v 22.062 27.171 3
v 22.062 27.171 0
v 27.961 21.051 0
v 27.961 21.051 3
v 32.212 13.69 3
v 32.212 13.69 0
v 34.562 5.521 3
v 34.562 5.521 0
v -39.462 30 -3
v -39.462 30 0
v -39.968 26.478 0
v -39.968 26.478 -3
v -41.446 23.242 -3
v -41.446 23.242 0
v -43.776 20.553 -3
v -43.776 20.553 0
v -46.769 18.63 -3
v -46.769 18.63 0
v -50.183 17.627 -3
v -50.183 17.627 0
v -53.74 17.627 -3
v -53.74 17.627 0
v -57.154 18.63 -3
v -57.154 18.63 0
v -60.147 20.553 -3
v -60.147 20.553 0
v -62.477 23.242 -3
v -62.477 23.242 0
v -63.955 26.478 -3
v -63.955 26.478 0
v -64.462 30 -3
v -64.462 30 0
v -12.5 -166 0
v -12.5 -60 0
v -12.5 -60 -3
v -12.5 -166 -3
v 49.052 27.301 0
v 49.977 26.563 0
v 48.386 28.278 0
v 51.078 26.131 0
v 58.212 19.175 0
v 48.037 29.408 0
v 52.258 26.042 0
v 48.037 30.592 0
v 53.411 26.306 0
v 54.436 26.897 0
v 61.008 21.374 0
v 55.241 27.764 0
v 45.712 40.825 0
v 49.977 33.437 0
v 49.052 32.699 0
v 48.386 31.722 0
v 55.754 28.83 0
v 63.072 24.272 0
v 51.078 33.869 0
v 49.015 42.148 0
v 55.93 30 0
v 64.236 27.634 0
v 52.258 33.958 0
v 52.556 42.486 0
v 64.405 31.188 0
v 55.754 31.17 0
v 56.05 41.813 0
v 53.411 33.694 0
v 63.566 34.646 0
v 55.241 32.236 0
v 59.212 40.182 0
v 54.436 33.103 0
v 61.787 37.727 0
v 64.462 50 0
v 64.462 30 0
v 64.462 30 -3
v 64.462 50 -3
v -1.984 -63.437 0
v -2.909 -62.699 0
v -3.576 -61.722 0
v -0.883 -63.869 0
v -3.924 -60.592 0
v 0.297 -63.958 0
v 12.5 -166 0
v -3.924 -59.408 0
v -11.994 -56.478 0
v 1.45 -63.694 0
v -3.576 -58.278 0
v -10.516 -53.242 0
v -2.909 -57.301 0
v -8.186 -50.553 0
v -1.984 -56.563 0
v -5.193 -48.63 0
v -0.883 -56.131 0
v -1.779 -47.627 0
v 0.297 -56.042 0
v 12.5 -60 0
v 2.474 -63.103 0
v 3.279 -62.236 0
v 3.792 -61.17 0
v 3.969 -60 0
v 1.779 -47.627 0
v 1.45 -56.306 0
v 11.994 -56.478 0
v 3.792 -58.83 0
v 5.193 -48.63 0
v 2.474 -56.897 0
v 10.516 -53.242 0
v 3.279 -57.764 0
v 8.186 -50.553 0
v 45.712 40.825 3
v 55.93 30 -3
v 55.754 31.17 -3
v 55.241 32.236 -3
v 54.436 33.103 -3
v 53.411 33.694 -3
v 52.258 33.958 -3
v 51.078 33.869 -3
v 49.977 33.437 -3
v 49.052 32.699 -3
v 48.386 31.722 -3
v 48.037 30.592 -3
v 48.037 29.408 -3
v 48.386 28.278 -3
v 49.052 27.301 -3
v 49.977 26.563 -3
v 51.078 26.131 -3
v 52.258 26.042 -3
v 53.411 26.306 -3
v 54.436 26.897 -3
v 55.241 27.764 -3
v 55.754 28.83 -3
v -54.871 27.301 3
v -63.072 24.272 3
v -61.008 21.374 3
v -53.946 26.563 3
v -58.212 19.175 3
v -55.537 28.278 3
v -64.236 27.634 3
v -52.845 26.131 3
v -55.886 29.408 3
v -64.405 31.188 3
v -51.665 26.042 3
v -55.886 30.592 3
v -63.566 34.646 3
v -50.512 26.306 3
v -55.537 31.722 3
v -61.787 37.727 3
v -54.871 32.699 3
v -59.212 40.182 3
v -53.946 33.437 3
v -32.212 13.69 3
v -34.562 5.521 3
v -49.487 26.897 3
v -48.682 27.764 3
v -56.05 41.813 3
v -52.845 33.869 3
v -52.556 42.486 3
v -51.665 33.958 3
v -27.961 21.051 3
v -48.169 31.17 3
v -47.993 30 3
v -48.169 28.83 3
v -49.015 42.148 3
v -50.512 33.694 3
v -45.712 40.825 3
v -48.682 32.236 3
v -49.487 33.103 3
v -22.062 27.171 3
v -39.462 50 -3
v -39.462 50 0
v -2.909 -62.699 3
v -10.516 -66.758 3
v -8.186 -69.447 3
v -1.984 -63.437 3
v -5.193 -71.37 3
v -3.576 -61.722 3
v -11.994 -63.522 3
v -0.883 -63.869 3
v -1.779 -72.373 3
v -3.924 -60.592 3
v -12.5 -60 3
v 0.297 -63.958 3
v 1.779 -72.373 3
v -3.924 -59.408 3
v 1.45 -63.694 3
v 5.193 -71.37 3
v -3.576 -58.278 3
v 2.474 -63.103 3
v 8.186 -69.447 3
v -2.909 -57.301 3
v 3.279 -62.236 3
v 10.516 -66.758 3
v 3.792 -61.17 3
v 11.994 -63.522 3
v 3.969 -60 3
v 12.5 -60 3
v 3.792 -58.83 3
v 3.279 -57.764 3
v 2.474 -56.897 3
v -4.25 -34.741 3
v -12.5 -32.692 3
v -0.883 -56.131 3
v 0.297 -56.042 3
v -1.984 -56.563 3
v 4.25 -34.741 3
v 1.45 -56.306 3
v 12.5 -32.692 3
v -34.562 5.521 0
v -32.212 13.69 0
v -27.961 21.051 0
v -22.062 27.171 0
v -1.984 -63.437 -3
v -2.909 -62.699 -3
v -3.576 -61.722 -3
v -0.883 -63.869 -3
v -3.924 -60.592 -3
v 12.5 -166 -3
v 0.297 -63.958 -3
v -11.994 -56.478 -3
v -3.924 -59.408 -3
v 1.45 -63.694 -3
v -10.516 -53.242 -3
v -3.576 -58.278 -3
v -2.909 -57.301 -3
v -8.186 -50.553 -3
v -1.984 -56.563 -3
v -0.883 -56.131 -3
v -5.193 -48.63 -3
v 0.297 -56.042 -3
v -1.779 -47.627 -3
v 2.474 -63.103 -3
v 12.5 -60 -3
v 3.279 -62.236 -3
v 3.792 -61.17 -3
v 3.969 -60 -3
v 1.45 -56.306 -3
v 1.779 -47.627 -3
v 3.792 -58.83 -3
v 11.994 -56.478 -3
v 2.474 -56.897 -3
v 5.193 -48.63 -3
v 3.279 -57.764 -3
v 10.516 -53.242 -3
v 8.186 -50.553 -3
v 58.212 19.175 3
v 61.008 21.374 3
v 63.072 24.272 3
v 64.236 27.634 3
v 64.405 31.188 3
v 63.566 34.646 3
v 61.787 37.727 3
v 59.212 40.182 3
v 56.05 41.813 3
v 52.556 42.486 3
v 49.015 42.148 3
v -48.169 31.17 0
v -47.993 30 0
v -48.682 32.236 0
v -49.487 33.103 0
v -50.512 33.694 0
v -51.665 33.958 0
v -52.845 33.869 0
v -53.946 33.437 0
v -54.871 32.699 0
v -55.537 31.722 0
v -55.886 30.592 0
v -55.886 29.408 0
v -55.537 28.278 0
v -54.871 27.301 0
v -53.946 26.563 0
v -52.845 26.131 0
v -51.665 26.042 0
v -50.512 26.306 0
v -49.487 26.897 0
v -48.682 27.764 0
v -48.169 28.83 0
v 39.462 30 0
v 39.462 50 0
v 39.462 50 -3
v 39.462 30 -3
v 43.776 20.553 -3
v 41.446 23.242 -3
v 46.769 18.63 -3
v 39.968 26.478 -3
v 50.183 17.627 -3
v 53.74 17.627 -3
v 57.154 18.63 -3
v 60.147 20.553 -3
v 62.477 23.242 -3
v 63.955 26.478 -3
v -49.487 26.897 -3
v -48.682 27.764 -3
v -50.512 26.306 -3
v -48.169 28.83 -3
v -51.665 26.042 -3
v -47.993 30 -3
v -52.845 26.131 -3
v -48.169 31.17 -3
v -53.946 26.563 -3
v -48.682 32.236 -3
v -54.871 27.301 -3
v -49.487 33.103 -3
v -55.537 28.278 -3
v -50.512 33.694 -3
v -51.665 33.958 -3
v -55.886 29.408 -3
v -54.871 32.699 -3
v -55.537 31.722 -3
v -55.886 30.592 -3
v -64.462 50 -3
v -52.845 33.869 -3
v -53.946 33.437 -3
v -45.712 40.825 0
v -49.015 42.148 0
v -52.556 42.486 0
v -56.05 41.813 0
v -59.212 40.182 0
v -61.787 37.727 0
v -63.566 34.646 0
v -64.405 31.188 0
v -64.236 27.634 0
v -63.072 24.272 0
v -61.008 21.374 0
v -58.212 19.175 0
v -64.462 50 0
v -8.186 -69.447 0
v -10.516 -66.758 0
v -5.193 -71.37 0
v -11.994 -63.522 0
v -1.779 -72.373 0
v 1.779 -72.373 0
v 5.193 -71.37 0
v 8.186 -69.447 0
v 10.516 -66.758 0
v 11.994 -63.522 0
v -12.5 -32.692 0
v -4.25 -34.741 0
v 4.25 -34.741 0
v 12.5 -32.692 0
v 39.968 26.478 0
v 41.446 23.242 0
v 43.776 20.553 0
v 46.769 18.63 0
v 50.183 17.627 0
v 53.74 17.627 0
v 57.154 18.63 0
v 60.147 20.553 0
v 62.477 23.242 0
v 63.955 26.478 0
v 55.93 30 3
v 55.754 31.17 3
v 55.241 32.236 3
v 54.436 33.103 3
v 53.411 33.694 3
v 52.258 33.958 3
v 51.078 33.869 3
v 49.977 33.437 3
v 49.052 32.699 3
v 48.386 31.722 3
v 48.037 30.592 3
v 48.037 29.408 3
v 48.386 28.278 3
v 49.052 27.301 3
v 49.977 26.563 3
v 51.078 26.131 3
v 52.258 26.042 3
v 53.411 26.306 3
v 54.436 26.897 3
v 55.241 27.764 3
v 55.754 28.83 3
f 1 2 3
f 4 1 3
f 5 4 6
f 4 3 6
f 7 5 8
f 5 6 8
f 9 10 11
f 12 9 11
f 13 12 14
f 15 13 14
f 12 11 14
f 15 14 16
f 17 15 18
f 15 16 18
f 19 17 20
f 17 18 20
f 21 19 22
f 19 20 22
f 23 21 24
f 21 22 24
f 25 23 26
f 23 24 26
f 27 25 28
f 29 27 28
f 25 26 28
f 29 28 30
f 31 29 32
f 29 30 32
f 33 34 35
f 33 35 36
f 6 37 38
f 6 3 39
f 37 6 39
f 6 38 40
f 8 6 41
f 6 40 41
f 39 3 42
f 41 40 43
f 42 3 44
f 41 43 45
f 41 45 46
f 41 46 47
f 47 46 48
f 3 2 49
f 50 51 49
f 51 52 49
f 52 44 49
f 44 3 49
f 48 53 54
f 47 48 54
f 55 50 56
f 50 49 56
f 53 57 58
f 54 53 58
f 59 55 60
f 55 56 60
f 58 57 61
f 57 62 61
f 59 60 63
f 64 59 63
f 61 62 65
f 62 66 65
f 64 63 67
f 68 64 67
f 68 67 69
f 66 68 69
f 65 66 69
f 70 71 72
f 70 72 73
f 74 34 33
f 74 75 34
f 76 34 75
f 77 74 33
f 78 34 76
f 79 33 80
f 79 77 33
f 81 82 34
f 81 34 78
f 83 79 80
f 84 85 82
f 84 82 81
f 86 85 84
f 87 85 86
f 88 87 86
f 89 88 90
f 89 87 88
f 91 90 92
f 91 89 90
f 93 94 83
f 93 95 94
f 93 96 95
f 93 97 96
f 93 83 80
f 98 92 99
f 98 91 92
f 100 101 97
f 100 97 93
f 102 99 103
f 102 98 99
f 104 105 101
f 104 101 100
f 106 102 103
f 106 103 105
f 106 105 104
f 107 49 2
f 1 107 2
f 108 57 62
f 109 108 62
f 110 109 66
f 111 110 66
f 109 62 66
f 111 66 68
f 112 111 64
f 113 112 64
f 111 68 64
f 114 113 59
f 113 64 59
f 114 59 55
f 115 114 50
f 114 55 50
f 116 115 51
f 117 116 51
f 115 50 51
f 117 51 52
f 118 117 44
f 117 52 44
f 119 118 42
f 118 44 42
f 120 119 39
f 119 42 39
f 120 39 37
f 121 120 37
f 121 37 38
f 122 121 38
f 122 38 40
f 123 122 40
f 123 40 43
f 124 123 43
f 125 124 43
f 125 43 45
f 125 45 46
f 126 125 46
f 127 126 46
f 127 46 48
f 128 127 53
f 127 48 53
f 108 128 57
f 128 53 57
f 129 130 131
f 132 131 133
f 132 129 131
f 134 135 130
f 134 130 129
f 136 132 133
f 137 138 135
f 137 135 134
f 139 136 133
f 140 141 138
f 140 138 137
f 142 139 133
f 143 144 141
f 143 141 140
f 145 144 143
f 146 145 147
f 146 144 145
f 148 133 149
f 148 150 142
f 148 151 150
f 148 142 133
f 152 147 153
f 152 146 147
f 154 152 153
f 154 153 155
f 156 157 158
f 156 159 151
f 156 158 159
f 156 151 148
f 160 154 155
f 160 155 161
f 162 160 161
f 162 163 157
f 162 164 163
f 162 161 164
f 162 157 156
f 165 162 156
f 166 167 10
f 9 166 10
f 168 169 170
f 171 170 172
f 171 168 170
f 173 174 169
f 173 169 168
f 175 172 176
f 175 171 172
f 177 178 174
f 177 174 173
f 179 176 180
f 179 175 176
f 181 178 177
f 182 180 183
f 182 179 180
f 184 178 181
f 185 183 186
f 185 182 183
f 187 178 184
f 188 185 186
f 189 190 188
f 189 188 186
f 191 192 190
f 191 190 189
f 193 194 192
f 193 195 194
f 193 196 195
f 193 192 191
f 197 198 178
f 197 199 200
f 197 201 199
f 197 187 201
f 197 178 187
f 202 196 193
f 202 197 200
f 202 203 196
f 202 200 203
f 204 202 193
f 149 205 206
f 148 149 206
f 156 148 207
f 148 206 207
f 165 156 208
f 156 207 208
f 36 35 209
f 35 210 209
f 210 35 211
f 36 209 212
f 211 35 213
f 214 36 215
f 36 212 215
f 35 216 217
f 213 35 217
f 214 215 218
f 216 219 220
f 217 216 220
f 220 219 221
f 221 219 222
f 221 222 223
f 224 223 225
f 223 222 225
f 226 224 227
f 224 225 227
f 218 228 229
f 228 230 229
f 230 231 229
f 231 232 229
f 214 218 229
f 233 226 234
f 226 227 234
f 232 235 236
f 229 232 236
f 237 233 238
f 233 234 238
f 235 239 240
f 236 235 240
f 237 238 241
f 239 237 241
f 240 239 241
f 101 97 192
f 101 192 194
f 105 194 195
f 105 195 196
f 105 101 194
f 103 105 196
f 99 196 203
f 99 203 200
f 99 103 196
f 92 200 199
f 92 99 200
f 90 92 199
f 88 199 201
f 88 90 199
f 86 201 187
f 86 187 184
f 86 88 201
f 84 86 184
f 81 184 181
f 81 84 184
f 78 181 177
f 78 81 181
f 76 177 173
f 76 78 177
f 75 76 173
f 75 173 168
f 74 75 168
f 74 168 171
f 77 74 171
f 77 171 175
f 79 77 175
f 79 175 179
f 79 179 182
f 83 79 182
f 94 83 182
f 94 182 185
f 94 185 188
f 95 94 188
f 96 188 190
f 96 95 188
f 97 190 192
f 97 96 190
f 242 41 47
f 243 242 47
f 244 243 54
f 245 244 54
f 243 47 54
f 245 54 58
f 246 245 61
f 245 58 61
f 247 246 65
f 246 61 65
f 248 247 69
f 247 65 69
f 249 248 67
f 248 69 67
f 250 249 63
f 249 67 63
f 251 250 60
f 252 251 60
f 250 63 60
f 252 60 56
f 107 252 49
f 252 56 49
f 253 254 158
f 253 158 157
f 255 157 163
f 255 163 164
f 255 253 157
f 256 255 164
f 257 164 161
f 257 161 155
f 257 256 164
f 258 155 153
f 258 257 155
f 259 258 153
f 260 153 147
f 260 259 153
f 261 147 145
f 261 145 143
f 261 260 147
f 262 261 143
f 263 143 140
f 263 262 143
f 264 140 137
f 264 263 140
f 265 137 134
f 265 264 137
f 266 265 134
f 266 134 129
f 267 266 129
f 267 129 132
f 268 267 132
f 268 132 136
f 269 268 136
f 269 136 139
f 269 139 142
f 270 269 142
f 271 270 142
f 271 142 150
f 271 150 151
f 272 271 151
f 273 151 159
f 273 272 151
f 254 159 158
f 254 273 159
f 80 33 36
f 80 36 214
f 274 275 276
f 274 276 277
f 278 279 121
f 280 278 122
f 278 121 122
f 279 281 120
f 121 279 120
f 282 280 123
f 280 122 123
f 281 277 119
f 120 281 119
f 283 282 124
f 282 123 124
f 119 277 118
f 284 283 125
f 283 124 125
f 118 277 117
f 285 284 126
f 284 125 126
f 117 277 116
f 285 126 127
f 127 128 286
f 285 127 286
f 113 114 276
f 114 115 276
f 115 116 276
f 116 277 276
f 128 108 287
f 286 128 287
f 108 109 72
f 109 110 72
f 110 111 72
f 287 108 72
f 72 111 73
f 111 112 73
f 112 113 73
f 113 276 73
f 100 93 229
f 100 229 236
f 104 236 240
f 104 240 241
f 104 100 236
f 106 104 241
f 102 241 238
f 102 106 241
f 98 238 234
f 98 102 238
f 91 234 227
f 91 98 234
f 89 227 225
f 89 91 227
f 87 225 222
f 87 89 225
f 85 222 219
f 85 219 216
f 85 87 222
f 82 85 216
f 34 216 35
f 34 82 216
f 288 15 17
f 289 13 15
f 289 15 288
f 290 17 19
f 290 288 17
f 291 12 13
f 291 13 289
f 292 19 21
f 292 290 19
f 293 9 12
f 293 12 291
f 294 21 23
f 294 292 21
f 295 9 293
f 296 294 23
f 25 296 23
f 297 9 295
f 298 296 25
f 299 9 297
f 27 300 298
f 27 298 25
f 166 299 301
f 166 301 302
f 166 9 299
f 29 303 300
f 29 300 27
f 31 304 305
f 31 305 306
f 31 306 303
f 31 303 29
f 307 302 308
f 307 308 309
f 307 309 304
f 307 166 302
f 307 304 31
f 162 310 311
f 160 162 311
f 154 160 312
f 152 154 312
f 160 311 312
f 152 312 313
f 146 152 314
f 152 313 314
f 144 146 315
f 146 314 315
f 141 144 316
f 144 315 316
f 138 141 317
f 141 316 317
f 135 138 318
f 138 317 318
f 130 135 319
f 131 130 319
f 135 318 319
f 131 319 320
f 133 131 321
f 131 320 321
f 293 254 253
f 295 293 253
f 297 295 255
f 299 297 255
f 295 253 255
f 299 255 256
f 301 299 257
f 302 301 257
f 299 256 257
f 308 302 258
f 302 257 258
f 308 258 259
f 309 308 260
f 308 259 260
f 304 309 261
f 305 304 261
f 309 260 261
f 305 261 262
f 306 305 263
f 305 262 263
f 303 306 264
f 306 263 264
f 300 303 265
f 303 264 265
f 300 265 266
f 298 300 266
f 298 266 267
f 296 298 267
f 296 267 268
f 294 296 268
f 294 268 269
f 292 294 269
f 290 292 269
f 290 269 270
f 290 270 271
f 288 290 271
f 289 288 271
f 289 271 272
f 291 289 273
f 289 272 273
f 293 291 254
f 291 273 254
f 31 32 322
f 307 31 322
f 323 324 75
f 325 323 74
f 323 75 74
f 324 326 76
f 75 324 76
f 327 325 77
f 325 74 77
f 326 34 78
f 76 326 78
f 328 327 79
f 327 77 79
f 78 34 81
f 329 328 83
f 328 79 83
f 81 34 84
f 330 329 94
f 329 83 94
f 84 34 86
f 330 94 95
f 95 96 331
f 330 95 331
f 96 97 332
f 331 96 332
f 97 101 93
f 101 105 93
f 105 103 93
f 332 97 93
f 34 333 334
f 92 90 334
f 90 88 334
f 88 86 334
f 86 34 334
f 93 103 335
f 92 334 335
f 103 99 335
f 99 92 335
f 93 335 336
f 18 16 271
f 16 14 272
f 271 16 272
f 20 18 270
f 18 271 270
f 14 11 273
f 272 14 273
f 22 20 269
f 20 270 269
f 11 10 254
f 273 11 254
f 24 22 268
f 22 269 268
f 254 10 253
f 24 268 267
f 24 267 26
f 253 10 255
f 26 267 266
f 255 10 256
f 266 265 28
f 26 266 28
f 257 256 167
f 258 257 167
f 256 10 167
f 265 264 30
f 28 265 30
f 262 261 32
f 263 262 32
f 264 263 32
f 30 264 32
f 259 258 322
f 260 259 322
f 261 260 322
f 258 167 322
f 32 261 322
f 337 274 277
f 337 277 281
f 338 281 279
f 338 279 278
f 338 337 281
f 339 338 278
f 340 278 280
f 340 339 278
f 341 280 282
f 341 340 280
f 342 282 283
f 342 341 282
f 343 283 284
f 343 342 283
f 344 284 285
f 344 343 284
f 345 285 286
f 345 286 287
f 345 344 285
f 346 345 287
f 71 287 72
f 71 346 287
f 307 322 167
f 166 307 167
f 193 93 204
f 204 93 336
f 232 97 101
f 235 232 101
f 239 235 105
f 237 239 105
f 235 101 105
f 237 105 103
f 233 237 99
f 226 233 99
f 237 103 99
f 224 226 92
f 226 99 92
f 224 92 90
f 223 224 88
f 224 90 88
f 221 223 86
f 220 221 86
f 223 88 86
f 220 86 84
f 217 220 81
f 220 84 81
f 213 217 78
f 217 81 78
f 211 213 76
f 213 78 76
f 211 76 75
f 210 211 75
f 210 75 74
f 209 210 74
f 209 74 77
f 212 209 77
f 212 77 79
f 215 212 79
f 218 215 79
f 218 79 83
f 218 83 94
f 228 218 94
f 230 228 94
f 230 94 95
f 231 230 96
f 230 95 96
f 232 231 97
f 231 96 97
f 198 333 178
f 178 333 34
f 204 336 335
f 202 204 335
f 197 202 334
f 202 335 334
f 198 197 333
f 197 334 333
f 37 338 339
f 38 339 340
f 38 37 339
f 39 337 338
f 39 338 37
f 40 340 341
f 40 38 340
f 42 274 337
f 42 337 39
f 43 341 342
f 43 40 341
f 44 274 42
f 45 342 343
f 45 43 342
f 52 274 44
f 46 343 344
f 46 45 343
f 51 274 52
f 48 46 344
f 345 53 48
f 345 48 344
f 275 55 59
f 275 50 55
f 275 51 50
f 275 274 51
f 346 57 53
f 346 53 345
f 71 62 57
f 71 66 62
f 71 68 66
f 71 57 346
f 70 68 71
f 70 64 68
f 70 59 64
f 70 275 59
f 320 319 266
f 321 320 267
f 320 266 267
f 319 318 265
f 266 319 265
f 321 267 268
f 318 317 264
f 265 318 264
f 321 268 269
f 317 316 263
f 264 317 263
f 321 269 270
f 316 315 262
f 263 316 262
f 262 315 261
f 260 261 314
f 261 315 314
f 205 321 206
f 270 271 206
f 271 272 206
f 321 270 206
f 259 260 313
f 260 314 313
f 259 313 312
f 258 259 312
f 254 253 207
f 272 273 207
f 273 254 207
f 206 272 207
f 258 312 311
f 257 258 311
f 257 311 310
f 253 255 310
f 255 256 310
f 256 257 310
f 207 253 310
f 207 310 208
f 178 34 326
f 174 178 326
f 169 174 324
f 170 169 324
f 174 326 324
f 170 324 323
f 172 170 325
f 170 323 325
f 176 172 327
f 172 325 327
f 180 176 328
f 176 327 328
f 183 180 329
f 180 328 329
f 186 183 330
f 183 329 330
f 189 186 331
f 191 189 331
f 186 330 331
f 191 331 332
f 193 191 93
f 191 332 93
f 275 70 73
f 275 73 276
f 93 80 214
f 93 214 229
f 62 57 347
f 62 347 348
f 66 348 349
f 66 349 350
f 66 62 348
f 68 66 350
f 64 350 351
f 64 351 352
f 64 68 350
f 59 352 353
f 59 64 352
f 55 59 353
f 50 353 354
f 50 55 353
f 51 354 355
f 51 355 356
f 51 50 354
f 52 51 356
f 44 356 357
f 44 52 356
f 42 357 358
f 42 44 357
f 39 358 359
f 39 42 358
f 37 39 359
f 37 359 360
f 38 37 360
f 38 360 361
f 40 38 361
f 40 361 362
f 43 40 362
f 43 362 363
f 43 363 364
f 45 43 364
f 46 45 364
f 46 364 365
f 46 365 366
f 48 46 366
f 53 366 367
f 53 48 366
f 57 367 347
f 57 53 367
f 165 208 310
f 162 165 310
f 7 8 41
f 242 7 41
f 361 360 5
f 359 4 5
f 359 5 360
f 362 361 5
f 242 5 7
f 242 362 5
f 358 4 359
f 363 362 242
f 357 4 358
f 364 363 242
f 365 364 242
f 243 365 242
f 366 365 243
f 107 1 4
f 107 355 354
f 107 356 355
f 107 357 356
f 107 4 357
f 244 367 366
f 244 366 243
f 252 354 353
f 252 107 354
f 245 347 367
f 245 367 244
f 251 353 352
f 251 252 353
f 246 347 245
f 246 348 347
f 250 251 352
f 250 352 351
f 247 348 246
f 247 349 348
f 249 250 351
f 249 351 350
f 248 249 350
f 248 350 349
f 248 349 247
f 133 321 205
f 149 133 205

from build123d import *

# Parameters (mm, degrees)
SKETCH1_R             = 3.96875
BOSS_EXTRUDE1_DEPTH   = 3
BOSS_EXTRUDE1_2_DEPTH = 3
BOSS_EXTRUDE1_3_DEPTH = 3
SKETCH2_R             = 3.96875
BOSS_EXTRUDE2_DEPTH   = 3
BOSS_EXTRUDE2_2_DEPTH = 3
BOSS_EXTRUDE2_3_DEPTH = 3


with BuildPart() as part:
    # Sketch1 → Boss-Extrude1 (new body)
    with BuildSketch(Plane.XY):
        with BuildLine():
            ThreePointArc((-45.711524227, 40.825317547), (-62.786841774, 36.25), (-58.211524227, 19.174682453))
            Line((-58.211524227, 19.174682453), (-34.561879132, 5.520553491))
            ThreePointArc((-34.561879132, 5.520553491), (-30.310889132, 17.5), (-22.061879132, 27.171188586))
            Line((-22.061879132, 27.171188586), (-45.711524227, 40.825317547))
        make_face()
        with Locations((-51.961524227, 30)):
            Circle(SKETCH1_R, mode=Mode.SUBTRACT)
    extrude(amount=BOSS_EXTRUDE1_DEPTH)


with BuildPart() as body_2:
    # Sketch1 → Boss-Extrude1 2 (new body)
    with BuildSketch(Plane.XY):
        with BuildLine():
            ThreePointArc((58.211524227, 19.174682453), (62.786841774, 36.25), (45.711524227, 40.825317547))
            Line((45.711524227, 40.825317547), (22.061879132, 27.171188586))
            ThreePointArc((22.061879132, 27.171188586), (30.310889132, 17.5), (34.561879132, 5.520553491))
            Line((34.561879132, 5.520553491), (58.211524227, 19.174682453))
        make_face()
        with Locations((51.961524227, 30)):
            Circle(SKETCH1_R, mode=Mode.SUBTRACT)
    extrude(amount=BOSS_EXTRUDE1_2_DEPTH)


with BuildPart() as body_3:
    # Sketch1 → Boss-Extrude1 3 (new body)
    with BuildSketch(Plane.XY):
        with BuildLine():
            ThreePointArc((-12.5, -60), (0, -72.5), (12.5, -60))
            Line((12.5, -60), (12.5, -32.691742077))
            ThreePointArc((12.5, -32.691742077), (0, -35), (-12.5, -32.691742077))
            Line((-12.5, -32.691742077), (-12.5, -60))
        make_face()
        with Locations((0, -60)):
            Circle(SKETCH1_R, mode=Mode.SUBTRACT)
    extrude(amount=BOSS_EXTRUDE1_3_DEPTH)


with BuildPart() as body_4:
    # Sketch2 → Boss-Extrude2 (new body)
    with BuildSketch(Plane.XY):
        with BuildLine():
            Line((-64.461524227, 30), (-64.461524227, 50))
            Line((-64.461524227, 50), (-39.461524227, 50))
            Line((-39.461524227, 50), (-39.461524227, 30))
            ThreePointArc((-39.461524227, 30), (-51.961524227, 17.5), (-64.461524227, 30))
        make_face()
        with Locations((-51.961524227, 30)):
            Circle(SKETCH2_R, mode=Mode.SUBTRACT)
    extrude(amount=-BOSS_EXTRUDE2_DEPTH)


with BuildPart() as body_5:
    # Sketch2 → Boss-Extrude2 2 (new body)
    with BuildSketch(Plane.XY):
        with BuildLine():
            Line((64.461524227, 30), (64.461524227, 50))
            Line((64.461524227, 50), (39.461524227, 50))
            Line((39.461524227, 50), (39.461524227, 30))
            ThreePointArc((39.461524227, 30), (51.961524227, 17.5), (64.461524227, 30))
        make_face()
        with Locations((51.961524227, 30)):
            Circle(SKETCH2_R, mode=Mode.SUBTRACT)
    extrude(amount=-BOSS_EXTRUDE2_2_DEPTH)


with BuildPart() as body_6:
    # Sketch2 → Boss-Extrude2 3 (new body)
    with BuildSketch(Plane.XY):
        with BuildLine():
            Line((-12.5, -60), (-12.5, -166))
            Line((-12.5, -166), (12.5, -166))
            Line((12.5, -166), (12.5, -60))
            ThreePointArc((12.5, -60), (0, -47.5), (-12.5, -60))
        make_face()
        with Locations((0, -60)):
            Circle(SKETCH2_R, mode=Mode.SUBTRACT)
    extrude(amount=-BOSS_EXTRUDE2_3_DEPTH)


solid = Compound([part.part, body_2.part, body_3.part, body_4.part, body_5.part, body_6.part])
